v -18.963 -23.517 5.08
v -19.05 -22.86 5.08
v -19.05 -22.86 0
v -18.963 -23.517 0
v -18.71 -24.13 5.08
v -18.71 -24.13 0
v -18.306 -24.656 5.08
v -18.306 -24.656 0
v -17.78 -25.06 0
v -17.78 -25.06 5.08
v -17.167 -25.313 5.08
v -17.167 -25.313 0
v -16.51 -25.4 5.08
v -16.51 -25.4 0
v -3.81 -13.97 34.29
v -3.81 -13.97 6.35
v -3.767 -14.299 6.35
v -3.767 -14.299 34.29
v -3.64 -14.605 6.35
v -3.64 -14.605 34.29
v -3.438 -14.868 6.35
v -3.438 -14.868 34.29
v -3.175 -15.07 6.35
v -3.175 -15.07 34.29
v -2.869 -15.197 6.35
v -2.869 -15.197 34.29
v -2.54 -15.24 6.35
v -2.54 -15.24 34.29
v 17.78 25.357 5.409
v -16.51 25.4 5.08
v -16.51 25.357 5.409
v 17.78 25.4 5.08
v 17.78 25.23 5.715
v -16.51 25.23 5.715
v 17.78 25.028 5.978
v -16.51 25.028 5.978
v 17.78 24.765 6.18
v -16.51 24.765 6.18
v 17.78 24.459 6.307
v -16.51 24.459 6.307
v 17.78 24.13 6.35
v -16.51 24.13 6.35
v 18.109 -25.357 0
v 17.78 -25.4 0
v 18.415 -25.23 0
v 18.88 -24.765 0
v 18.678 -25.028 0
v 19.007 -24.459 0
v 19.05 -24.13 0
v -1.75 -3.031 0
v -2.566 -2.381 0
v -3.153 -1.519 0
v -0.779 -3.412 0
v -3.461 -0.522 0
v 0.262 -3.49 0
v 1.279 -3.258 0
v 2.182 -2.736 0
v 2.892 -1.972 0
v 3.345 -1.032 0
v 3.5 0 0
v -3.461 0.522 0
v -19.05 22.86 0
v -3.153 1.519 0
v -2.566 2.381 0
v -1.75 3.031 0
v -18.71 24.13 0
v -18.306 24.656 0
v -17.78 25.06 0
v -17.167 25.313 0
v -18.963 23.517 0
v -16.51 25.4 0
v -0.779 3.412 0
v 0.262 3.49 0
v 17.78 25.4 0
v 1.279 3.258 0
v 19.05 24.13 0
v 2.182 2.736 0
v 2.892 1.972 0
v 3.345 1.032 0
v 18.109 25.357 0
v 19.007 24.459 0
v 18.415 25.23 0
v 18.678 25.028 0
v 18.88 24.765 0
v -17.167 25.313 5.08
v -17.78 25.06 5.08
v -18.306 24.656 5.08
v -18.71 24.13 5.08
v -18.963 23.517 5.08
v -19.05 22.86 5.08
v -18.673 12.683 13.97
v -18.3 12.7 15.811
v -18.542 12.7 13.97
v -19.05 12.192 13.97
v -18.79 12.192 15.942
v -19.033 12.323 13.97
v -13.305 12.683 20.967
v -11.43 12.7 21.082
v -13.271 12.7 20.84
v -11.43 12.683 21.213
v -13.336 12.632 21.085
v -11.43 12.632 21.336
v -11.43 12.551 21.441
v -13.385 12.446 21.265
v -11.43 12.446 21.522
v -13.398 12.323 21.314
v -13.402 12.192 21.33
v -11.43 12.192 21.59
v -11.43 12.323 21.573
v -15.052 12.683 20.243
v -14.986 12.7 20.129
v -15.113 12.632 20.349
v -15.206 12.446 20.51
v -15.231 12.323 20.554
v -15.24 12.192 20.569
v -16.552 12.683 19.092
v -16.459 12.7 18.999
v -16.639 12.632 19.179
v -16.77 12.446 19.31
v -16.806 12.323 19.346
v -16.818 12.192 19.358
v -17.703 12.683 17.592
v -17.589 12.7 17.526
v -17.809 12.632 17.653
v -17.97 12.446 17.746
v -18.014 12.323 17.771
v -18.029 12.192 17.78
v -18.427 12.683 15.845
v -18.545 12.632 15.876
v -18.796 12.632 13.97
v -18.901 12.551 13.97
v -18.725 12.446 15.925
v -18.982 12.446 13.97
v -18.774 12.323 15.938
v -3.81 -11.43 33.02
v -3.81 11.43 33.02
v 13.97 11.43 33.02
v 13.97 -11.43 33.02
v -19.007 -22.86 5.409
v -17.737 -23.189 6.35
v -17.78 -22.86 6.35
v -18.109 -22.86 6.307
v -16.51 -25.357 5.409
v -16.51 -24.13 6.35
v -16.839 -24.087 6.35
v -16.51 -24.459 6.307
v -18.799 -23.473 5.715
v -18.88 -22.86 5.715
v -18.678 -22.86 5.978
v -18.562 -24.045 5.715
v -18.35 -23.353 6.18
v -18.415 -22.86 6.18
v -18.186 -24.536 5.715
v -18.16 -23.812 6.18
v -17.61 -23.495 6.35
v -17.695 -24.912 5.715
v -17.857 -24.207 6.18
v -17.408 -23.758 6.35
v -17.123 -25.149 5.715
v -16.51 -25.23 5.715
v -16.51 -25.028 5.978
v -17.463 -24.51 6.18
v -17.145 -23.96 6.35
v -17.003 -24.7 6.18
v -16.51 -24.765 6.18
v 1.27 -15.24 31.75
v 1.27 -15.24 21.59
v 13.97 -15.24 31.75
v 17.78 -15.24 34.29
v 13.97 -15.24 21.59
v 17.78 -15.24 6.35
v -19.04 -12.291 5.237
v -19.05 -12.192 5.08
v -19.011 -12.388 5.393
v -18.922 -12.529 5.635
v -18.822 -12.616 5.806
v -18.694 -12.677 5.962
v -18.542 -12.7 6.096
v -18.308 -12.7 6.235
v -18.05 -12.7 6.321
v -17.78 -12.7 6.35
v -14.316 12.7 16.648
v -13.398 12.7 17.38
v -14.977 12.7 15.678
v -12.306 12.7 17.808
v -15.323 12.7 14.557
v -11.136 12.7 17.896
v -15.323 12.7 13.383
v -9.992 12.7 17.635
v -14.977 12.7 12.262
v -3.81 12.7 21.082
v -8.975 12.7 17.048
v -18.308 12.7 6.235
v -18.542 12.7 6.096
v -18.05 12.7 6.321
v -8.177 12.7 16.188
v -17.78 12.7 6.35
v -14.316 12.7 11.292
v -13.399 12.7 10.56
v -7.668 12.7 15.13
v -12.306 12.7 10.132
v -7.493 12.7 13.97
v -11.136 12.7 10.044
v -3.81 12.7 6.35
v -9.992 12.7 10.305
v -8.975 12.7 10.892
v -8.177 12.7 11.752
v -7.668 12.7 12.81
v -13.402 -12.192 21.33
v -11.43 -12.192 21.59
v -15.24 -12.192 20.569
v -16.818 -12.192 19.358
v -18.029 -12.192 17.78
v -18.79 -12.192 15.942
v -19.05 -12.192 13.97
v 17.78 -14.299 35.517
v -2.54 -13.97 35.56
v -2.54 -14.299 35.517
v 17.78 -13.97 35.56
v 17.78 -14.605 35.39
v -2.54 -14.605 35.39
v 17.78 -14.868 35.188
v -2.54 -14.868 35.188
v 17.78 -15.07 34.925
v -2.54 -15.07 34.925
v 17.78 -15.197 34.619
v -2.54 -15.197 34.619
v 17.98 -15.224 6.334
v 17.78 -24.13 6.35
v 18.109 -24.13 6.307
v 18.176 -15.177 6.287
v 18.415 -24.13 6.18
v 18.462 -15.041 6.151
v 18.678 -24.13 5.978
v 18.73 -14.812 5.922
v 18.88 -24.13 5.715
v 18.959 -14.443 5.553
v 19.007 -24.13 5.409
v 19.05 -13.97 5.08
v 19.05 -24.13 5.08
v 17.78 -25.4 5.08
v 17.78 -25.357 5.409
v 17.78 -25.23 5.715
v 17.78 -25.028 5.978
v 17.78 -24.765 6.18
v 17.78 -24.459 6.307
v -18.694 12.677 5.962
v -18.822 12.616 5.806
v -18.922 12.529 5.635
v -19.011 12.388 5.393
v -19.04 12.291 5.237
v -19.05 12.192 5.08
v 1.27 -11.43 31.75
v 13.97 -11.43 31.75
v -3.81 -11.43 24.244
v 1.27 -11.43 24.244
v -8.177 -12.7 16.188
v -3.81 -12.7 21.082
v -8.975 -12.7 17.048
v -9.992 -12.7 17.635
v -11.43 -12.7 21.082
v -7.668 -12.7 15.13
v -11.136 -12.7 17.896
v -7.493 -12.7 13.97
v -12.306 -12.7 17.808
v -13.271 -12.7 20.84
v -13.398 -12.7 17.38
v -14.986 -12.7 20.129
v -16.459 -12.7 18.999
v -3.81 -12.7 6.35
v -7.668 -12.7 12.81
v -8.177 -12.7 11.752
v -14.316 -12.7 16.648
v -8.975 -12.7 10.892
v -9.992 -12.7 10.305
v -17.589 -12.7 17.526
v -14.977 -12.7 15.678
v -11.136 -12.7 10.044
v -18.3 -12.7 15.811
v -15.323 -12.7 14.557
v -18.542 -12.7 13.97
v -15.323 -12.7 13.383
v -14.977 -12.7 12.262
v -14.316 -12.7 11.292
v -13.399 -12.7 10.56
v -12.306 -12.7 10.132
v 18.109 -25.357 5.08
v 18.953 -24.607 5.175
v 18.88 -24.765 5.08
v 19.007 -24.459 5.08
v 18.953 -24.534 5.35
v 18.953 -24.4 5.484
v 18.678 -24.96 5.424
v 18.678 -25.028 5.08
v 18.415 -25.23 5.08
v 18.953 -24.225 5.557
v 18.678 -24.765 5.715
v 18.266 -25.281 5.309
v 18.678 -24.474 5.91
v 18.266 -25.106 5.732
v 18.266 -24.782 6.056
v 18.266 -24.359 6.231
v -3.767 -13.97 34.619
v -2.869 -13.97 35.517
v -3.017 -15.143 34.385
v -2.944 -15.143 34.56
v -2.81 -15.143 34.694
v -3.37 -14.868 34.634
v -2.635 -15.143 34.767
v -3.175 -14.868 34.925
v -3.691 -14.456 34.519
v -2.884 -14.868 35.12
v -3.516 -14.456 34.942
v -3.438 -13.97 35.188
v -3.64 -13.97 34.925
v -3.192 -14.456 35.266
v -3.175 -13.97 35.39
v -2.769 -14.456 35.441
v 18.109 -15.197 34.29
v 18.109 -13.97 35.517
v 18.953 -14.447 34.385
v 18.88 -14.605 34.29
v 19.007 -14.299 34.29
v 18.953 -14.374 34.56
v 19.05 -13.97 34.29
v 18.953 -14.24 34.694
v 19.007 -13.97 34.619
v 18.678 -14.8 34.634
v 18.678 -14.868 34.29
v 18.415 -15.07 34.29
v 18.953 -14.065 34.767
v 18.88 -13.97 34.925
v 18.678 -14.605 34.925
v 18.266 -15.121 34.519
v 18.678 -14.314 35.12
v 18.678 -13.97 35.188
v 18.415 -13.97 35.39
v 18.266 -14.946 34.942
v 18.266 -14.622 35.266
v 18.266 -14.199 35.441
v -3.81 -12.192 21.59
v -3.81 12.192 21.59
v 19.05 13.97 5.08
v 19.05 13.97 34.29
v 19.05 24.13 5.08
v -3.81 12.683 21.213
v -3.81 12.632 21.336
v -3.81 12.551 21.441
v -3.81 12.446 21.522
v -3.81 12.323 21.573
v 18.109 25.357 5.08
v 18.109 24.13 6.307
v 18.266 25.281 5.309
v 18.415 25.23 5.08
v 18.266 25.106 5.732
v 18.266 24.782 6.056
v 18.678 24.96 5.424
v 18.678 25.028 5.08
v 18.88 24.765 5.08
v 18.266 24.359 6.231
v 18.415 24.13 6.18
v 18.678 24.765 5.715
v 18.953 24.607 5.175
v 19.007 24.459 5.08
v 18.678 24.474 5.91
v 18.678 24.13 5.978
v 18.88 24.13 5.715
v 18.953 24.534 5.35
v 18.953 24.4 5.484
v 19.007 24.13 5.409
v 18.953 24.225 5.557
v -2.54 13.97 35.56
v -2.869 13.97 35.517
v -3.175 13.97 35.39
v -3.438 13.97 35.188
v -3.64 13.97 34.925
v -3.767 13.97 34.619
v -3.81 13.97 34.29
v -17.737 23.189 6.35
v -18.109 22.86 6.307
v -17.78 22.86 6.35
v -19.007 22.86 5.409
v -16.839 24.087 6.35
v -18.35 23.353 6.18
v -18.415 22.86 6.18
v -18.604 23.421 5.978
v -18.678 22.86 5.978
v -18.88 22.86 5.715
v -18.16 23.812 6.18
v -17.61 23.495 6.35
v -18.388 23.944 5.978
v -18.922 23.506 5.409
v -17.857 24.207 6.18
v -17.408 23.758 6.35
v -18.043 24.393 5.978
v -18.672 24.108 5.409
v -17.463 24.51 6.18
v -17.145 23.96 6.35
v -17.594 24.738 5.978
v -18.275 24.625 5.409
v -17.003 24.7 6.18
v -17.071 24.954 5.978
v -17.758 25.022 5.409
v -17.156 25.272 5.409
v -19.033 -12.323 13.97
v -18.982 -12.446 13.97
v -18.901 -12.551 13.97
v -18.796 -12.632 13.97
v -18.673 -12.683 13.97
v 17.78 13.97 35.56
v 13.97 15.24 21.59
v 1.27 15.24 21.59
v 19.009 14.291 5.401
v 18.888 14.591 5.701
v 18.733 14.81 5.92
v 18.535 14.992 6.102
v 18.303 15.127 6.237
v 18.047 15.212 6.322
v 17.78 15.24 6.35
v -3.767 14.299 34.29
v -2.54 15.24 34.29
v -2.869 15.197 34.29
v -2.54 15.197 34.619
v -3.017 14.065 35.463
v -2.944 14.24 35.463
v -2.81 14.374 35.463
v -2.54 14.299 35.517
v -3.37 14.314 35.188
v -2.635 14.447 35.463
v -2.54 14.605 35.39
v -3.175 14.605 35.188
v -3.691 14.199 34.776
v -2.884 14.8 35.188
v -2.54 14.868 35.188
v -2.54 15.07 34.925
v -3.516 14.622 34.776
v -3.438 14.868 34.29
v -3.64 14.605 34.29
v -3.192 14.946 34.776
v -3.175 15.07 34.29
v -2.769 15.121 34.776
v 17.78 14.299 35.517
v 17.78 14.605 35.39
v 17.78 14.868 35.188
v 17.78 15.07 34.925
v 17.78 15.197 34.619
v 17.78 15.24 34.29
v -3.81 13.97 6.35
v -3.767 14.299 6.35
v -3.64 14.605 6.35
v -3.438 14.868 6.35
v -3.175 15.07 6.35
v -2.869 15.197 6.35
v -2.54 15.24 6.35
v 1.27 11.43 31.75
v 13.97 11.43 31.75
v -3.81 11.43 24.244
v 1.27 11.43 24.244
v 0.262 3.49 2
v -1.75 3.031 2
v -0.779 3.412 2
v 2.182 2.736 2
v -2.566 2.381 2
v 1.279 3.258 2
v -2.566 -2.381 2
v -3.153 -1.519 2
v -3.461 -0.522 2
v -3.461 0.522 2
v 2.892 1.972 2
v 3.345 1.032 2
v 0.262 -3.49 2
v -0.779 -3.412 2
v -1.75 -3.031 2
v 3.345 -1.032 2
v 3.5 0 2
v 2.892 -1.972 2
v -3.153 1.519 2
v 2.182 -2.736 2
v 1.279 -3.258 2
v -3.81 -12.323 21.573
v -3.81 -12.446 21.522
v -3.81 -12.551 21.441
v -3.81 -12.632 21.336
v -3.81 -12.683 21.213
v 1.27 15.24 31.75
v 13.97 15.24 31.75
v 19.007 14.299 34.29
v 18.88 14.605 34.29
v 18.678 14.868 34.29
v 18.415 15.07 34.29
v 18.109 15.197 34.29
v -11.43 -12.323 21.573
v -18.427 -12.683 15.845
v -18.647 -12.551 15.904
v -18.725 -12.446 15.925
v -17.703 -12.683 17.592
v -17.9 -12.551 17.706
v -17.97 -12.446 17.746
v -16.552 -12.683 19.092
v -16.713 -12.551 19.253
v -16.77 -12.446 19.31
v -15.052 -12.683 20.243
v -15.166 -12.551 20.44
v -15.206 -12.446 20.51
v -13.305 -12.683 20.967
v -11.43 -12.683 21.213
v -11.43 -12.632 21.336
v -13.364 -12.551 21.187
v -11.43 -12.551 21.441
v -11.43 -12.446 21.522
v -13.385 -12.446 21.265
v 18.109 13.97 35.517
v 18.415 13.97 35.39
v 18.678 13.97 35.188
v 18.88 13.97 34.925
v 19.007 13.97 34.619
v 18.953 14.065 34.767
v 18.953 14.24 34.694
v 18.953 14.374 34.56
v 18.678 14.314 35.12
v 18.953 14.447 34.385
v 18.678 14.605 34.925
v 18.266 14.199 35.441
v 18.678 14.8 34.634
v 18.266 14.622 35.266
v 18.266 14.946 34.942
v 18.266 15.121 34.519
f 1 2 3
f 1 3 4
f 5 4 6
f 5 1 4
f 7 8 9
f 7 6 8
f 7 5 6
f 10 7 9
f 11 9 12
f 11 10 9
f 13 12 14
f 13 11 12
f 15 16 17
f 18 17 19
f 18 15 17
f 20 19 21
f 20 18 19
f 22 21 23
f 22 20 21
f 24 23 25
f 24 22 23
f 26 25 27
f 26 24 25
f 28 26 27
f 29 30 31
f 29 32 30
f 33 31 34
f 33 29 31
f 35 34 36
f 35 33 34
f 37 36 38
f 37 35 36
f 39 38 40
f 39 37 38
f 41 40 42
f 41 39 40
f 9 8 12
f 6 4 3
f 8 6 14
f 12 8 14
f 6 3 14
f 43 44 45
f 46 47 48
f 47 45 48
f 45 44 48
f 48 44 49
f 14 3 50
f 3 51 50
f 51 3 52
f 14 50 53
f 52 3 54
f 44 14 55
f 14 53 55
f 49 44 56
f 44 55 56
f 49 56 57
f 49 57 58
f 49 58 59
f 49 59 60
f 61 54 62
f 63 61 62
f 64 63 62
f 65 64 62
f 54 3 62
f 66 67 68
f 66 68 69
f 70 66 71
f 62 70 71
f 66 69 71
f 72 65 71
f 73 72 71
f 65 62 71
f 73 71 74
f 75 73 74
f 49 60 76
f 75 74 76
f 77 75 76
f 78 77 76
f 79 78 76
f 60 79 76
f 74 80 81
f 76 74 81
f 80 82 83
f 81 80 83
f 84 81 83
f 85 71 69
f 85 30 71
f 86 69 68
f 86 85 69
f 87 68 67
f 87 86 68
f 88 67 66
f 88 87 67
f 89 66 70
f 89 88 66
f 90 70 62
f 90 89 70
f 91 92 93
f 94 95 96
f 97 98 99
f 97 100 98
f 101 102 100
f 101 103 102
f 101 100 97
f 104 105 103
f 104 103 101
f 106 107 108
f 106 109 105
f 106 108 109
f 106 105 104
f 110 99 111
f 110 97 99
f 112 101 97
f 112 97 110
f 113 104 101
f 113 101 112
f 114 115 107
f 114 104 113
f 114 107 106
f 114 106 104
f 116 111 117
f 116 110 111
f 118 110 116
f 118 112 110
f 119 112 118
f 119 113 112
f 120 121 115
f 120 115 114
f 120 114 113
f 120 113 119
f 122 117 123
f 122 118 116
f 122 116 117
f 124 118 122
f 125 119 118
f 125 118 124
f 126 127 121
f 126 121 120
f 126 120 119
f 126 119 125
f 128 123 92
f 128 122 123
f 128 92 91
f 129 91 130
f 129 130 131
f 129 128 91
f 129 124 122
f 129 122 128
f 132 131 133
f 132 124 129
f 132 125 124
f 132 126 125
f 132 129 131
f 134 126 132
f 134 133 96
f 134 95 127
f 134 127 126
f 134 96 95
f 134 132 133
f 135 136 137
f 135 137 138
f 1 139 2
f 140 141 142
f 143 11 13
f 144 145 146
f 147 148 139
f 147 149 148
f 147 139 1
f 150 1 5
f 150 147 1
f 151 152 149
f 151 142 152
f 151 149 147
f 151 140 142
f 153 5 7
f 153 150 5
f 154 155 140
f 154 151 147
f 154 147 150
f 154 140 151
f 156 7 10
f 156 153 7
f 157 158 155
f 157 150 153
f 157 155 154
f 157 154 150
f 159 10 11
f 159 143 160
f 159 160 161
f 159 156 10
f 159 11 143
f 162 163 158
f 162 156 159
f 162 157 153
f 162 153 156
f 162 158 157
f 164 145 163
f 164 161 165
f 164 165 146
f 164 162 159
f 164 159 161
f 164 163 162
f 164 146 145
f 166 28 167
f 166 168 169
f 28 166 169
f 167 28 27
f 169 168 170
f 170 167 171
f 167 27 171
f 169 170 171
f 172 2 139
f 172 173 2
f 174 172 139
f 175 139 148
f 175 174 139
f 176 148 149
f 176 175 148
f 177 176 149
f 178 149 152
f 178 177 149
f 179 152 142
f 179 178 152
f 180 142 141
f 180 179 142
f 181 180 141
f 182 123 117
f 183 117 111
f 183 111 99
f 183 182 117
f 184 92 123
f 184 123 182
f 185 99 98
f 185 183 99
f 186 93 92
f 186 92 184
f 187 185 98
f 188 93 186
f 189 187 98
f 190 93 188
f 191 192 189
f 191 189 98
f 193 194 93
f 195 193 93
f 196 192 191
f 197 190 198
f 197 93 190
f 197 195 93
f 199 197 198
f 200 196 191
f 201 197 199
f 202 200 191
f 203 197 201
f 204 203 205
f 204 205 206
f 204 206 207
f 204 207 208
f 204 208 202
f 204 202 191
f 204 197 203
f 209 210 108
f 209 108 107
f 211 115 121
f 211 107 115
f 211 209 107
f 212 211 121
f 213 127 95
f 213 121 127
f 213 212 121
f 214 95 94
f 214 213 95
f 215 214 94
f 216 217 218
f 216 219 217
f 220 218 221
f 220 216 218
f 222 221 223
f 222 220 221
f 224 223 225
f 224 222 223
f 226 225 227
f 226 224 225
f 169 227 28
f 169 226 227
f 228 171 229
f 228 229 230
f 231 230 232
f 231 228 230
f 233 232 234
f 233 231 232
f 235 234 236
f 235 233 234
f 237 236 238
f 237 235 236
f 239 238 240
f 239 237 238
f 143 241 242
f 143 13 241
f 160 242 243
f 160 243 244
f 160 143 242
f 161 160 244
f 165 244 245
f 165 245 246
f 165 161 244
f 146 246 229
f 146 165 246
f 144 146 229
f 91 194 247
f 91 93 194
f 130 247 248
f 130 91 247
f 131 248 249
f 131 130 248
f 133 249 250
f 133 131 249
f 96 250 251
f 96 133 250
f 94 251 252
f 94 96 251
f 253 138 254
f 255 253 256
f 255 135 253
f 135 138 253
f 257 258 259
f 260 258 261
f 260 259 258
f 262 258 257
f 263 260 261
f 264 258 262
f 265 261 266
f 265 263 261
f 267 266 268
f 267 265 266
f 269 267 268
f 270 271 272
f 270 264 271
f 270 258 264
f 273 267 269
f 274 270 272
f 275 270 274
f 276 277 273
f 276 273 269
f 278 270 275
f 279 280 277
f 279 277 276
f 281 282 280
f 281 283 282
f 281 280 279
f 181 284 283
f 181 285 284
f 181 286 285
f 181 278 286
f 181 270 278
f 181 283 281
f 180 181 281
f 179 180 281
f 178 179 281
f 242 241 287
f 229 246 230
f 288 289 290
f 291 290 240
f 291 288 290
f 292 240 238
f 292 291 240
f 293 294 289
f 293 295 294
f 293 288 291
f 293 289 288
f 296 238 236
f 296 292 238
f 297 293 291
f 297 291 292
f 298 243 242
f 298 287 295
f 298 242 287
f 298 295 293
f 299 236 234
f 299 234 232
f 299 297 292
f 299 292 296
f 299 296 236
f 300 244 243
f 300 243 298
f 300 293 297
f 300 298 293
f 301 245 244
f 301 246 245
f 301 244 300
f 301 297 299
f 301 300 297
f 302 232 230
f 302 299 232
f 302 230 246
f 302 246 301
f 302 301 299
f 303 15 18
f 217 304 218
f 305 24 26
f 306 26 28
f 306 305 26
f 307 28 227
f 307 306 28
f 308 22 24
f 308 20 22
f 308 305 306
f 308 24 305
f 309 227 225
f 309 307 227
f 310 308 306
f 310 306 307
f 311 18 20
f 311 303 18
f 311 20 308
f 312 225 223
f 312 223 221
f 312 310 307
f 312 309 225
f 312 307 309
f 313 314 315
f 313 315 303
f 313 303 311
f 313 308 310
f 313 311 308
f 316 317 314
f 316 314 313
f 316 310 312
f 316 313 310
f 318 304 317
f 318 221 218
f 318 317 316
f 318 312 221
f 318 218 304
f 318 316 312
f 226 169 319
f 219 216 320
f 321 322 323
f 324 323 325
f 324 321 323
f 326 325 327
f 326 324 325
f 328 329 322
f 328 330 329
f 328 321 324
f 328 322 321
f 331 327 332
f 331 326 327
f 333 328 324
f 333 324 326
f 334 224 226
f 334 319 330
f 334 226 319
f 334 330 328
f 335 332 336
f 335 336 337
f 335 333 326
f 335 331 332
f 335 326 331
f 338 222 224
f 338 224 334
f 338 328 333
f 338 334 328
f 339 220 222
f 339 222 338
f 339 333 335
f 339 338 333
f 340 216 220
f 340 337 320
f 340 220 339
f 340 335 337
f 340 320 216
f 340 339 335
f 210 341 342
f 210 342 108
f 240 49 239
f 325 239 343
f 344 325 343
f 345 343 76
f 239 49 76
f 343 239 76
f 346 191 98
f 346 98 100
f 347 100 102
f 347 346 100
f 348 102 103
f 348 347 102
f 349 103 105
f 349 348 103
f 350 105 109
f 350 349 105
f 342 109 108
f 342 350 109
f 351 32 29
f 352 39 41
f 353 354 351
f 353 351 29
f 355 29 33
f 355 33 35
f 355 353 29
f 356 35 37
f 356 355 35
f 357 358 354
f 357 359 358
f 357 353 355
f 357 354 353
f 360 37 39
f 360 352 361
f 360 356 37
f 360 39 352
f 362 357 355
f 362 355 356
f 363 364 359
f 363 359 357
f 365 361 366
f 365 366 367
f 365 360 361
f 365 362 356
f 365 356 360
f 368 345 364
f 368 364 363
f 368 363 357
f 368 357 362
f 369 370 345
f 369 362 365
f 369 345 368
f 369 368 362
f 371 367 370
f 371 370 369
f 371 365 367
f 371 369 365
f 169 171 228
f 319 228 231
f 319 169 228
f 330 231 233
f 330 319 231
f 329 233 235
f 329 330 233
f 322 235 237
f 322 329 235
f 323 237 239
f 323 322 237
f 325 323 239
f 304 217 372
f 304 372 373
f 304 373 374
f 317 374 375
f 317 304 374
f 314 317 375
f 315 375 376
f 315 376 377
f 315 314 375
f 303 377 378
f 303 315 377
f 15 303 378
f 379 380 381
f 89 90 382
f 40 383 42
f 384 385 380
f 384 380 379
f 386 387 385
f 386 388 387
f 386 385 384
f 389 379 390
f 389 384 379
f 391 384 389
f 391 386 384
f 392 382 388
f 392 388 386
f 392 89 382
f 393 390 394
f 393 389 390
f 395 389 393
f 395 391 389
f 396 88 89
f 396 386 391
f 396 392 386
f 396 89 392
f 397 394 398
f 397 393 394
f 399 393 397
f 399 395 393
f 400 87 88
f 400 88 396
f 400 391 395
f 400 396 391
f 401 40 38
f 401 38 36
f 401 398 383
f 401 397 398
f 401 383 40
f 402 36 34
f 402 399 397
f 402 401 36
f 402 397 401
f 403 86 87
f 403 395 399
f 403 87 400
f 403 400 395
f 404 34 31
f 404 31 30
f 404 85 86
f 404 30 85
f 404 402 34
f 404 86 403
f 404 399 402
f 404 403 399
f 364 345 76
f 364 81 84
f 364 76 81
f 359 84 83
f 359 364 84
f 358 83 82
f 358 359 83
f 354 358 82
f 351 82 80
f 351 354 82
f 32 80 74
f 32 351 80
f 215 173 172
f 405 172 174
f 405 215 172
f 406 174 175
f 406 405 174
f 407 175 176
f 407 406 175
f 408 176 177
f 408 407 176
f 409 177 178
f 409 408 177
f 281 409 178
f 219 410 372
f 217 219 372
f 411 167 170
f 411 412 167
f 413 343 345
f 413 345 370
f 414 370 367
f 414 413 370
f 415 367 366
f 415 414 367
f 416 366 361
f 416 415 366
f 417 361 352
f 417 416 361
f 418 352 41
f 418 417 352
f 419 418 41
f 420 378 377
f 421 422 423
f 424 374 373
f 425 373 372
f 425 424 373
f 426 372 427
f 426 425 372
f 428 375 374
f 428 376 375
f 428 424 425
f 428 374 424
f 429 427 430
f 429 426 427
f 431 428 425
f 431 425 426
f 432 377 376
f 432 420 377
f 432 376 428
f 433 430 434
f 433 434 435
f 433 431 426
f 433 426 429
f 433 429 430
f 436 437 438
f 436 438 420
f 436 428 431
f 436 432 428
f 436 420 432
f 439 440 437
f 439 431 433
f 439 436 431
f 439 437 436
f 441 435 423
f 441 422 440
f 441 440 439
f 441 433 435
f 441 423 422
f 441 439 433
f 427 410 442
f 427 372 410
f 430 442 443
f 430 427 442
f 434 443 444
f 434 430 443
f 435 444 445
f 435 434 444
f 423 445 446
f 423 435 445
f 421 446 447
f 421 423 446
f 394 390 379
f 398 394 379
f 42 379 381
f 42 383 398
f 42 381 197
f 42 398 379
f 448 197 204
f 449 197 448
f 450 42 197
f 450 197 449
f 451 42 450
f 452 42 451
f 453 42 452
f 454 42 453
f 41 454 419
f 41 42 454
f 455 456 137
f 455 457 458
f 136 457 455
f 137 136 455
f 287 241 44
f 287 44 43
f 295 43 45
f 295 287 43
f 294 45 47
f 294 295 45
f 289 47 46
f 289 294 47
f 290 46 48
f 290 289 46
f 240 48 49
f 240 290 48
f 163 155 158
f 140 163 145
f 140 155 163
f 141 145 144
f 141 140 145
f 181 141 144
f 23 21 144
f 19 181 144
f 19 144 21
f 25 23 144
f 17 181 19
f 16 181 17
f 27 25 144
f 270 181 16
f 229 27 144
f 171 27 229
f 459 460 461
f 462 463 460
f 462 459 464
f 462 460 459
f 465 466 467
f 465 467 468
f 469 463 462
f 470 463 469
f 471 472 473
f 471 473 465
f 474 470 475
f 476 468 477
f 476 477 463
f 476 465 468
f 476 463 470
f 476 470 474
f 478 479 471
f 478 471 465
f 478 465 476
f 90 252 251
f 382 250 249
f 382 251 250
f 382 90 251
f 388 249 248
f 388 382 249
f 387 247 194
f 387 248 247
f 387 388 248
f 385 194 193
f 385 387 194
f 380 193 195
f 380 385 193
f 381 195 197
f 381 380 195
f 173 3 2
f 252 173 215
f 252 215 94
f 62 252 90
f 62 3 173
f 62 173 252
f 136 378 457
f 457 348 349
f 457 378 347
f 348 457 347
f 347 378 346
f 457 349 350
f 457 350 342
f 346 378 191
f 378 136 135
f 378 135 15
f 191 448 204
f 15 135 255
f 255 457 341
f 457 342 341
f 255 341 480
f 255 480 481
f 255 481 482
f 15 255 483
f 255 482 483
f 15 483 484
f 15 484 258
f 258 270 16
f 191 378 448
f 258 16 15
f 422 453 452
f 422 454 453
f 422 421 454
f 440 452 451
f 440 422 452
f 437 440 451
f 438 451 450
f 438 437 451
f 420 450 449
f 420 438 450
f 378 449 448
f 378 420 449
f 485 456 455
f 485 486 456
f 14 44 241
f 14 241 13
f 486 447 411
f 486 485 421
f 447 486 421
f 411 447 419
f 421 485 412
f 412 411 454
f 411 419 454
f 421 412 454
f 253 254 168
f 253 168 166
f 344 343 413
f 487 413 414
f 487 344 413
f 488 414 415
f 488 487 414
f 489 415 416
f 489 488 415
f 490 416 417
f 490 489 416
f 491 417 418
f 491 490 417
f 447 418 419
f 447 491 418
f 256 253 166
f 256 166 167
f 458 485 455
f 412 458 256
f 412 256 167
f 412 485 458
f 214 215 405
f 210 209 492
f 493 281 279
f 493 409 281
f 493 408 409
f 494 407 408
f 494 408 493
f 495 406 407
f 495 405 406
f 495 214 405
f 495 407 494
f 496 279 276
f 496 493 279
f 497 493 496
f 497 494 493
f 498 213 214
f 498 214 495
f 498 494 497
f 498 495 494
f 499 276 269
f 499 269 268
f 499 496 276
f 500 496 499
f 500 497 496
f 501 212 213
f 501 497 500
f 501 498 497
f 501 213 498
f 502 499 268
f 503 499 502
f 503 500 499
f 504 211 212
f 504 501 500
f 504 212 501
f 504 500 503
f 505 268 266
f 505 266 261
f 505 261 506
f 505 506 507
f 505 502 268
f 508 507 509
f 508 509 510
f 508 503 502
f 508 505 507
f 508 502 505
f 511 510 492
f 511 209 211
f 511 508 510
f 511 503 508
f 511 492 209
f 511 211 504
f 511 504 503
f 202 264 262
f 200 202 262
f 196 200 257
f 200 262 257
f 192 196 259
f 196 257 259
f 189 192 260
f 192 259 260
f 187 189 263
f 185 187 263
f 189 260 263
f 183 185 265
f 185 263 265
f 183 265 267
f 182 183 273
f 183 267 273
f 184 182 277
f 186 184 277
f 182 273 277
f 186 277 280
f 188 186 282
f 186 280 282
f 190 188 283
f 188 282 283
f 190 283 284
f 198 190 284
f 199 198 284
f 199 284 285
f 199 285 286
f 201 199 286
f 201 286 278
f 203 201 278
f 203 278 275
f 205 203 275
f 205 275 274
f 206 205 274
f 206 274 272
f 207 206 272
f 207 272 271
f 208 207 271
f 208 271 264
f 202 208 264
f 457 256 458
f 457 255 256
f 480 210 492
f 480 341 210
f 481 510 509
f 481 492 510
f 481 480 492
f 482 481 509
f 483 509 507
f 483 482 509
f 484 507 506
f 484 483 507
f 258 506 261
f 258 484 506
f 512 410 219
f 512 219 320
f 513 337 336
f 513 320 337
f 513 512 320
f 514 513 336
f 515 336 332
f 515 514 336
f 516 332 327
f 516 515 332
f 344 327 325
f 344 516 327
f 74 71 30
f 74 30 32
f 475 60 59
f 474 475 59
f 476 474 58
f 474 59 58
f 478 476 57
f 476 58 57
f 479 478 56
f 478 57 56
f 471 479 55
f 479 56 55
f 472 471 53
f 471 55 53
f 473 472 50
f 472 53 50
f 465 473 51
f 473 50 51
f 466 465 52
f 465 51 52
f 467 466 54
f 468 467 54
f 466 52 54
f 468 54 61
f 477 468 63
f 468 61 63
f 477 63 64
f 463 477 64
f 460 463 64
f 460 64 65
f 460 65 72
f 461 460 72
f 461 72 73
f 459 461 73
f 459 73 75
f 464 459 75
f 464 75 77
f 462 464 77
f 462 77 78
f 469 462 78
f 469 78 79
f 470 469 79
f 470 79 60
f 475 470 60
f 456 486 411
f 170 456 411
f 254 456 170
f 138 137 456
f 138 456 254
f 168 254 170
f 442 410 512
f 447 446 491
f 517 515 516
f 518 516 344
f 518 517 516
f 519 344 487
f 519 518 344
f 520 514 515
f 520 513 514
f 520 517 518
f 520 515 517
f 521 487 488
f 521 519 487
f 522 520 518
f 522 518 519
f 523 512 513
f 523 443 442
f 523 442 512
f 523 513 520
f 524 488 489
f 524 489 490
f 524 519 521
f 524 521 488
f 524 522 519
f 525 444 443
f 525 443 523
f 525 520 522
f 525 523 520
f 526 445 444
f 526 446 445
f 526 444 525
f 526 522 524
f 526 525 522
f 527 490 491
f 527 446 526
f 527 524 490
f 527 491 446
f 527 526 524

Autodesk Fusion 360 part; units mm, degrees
sketch "Sketch1" plane through (0, 0, 0) normal (0, 0, 1) x (1, 0, 0)
  line L0 (19.05, -25.4) -> (-19.05, -25.4)
  line L1 (-19.05, -25.4) -> (-19.05, 25.4)
  line L2 (-19.05, 25.4) -> (19.05, 25.4)
  line L3 (19.05, 25.4) -> (19.05, -25.4)
  line L4 (19.05, -25.4) -> (-19.05, 25.4) construction
  line L5 (-19.05, -25.4) -> (19.05, 25.4) construction
  dimension "d1" = 38.1
  dimension "d2" = 50.8
extrude "Extrude1" add sketch "Sketch1" along normal blind 6.35
sketch "Sketch2" plane through (0, 0, 6.35) normal (0, 0, 1) x (-1, 0, 0)
  line L0 (-19.05, -25.4) -> (19.05, -25.4)
  line L1 (19.05, -25.4) -> (19.05, 25.4)
  line L2 (19.05, 25.4) -> (-19.05, 25.4)
  line L3 (-19.05, 25.4) -> (-19.05, -25.4)
  line L4 (19.05, -12.7) -> (3.81, -12.7)
  line L5 (3.81, -12.7) -> (3.81, 12.7)
  line L6 (3.81, 12.7) -> (19.05, 12.7)
  line L7 (19.05, 12.7) -> (19.05, -12.7)
  line L8 (-19.05, -15.24) -> (3.81, -15.24)
  line L9 (3.81, -15.24) -> (3.81, 15.24)
  line L10 (3.81, 15.24) -> (-19.05, 15.24)
  line L11 (-19.05, 15.24) -> (-19.05, -15.24)
  dimension "d5" = 15.24
  dimension "d6" = 25.4
  dimension "d7" = 12.7
  dimension "d9" = 10.16
  dimension "d14" = 10.16
extrude "Extrude2" add sketch "Sketch2" along normal blind 15.24 contours L1 L4 L5 L6 L7 L9
extrude "Extrude3" add sketch "Sketch2" along normal blind 29.21 contours L3 L5 L8 L9 L10 L11
sketch "Sketch3" plane through (0, -12.7, 0) normal (0, -1, 0) x (1, 0, 0)
  line L0 (-19.05, 6.35) -> (-3.81, 6.35)
  line L1 (-3.81, 6.35) -> (-3.81, 21.59)
  line L2 (-3.81, 21.59) -> (-19.05, 21.59)
  line L3 (-19.05, 21.59) -> (-19.05, 6.35)
  circle A0 centre (-11.43, 13.97) radius 3.937
  dimension "d15" = 7.874
  dimension "d16" = 7.62
  dimension "d17" = 7.62
extrude "Extrude4" cut sketch "Sketch3" against normal through all contours A0
fillet "Fillet1" radius 2.54 2 edges at (-19.05, -25.4, 3.175) (-19.05, 25.4, 3.175)
fillet "Fillet2" radius 1.27 6 edges at (1.27, 25.4, 6.35) (-18.3061, 24.6561, 6.35) (-19.05, 17.78, 6.35) (-19.05, -17.78, 6.35) (-18.3061, -24.6561, 6.35) (1.27, -25.4, 6.35)
fillet "Fillet3" radius 7.62 1 edges at (-19.05, 0, 21.59)
fillet "Fillet4" radius 1.27 14 edges at (-3.81, 15.24, 20.955) (7.62, 15.24, 35.56) (-3.81, 0, 35.56) (7.62, -15.24, 35.56) (-3.81, -15.24, 20.955) (19.05, 0, 35.56) (19.05, -15.24, 20.955) (19.05, 15.24, 20.955) (19.05, -25.4, 2.54) (19.05, -25.028, 5.978) (19.05, -19.685, 6.35) (19.05, 19.685, 6.35) (19.05, 25.028, 5.978) (19.05, 25.4, 2.54)
fillet "Fillet5" radius 0.508 6 edges at (-7.62, 12.7, 21.59) (-16.8182, 12.7, 19.3582) (-19.05, 12.7, 9.525) (-19.05, -12.7, 9.525) (-16.8182, -12.7, 19.3582) (-7.62, -12.7, 21.59)
sketch "Sketch4" plane through (0, 15.24, 0) normal (0, 1, 0) x (-1, 0, 0)
  line L0 (2.54, 6.35) -> (2.54, 34.29)
  line L1 (2.54, 34.29) -> (-17.78, 34.29)
  line L2 (-17.78, 34.29) -> (-17.78, 6.35)
  line L3 (-17.78, 6.35) -> (2.54, 6.35)
  line L4 (-13.97, 31.75) -> (-1.27, 31.75)
  line L5 (-1.27, 31.75) -> (-1.27, 21.59)
  line L6 (-1.27, 21.59) -> (-13.97, 21.59)
  line L7 (-13.97, 21.59) -> (-13.97, 31.75)
  dimension "d29" = 3.81
  dimension "d30" = 3.81
  dimension "d31" = 2.54
  dimension "d32" = 10.16
extrude "Extrude5" cut sketch "Sketch4" against normal through all contours L4 L5 L6 L7
sketch "Sketch5" plane through (-3.81, 0, 0) normal (-1, 0, 0) x (0, -1, 0)
  line L0 (13.97, 6.35) -> (13.97, 34.29)
  line L1 (13.97, 34.29) -> (-13.97, 34.29)
  line L2 (-13.97, 34.29) -> (-13.97, 6.35)
  line L3 (-13.97, 6.35) -> (-12.7, 6.35)
  line L4 (-12.7, 6.35) -> (-12.7, 21.082)
  arc A0 (-12.192, 21.59) -> (-12.7, 21.082) centre (-12.192, 21.082) ccw
  line L5 (-12.192, 21.59) -> (12.192, 21.59)
  arc A1 (12.7, 21.082) -> (12.192, 21.59) centre (12.192, 21.082) ccw
  line L6 (12.7, 21.082) -> (12.7, 6.35)
  line L7 (12.7, 6.35) -> (13.97, 6.35)
  line L8 (-11.43, 33.02) -> (11.43, 33.02)
  line L9 (11.43, 33.02) -> (11.43, 24.2438)
  line L10 (11.43, 24.2438) -> (-11.43, 24.2438)
  line L11 (-11.43, 24.2438) -> (-11.43, 33.02)
extrude "Extrude6" cut sketch "Sketch5" against normal up to surface (17.78 mm away) contours L8 L9 L10 L11
sketch "Sketch6" plane through (0, 0, 0) normal (0, 0, -1) x (1, 0, 0)
  arc A0 (19.05, 24.13) -> (17.78, 25.4) centre (17.78, 24.13) ccw
  line L0 (17.78, 25.4) -> (-16.51, 25.4)
  arc A1 (-16.51, 25.4) -> (-19.05, 22.86) centre (-16.51, 22.86) ccw
  line L1 (-19.05, 22.86) -> (-19.05, -22.86)
  arc A2 (-19.05, -22.86) -> (-16.51, -25.4) centre (-16.51, -22.86) ccw
  line L2 (-16.51, -25.4) -> (17.78, -25.4)
  arc A3 (17.78, -25.4) -> (19.05, -24.13) centre (17.78, -24.13) ccw
  line L3 (19.05, -24.13) -> (19.05, 24.13)
  circle A4 centre (0, 0) radius 3.5
  dimension "d36" = 7
extrude "Extrude7" cut sketch "Sketch6" against normal blind 2 contours A4
